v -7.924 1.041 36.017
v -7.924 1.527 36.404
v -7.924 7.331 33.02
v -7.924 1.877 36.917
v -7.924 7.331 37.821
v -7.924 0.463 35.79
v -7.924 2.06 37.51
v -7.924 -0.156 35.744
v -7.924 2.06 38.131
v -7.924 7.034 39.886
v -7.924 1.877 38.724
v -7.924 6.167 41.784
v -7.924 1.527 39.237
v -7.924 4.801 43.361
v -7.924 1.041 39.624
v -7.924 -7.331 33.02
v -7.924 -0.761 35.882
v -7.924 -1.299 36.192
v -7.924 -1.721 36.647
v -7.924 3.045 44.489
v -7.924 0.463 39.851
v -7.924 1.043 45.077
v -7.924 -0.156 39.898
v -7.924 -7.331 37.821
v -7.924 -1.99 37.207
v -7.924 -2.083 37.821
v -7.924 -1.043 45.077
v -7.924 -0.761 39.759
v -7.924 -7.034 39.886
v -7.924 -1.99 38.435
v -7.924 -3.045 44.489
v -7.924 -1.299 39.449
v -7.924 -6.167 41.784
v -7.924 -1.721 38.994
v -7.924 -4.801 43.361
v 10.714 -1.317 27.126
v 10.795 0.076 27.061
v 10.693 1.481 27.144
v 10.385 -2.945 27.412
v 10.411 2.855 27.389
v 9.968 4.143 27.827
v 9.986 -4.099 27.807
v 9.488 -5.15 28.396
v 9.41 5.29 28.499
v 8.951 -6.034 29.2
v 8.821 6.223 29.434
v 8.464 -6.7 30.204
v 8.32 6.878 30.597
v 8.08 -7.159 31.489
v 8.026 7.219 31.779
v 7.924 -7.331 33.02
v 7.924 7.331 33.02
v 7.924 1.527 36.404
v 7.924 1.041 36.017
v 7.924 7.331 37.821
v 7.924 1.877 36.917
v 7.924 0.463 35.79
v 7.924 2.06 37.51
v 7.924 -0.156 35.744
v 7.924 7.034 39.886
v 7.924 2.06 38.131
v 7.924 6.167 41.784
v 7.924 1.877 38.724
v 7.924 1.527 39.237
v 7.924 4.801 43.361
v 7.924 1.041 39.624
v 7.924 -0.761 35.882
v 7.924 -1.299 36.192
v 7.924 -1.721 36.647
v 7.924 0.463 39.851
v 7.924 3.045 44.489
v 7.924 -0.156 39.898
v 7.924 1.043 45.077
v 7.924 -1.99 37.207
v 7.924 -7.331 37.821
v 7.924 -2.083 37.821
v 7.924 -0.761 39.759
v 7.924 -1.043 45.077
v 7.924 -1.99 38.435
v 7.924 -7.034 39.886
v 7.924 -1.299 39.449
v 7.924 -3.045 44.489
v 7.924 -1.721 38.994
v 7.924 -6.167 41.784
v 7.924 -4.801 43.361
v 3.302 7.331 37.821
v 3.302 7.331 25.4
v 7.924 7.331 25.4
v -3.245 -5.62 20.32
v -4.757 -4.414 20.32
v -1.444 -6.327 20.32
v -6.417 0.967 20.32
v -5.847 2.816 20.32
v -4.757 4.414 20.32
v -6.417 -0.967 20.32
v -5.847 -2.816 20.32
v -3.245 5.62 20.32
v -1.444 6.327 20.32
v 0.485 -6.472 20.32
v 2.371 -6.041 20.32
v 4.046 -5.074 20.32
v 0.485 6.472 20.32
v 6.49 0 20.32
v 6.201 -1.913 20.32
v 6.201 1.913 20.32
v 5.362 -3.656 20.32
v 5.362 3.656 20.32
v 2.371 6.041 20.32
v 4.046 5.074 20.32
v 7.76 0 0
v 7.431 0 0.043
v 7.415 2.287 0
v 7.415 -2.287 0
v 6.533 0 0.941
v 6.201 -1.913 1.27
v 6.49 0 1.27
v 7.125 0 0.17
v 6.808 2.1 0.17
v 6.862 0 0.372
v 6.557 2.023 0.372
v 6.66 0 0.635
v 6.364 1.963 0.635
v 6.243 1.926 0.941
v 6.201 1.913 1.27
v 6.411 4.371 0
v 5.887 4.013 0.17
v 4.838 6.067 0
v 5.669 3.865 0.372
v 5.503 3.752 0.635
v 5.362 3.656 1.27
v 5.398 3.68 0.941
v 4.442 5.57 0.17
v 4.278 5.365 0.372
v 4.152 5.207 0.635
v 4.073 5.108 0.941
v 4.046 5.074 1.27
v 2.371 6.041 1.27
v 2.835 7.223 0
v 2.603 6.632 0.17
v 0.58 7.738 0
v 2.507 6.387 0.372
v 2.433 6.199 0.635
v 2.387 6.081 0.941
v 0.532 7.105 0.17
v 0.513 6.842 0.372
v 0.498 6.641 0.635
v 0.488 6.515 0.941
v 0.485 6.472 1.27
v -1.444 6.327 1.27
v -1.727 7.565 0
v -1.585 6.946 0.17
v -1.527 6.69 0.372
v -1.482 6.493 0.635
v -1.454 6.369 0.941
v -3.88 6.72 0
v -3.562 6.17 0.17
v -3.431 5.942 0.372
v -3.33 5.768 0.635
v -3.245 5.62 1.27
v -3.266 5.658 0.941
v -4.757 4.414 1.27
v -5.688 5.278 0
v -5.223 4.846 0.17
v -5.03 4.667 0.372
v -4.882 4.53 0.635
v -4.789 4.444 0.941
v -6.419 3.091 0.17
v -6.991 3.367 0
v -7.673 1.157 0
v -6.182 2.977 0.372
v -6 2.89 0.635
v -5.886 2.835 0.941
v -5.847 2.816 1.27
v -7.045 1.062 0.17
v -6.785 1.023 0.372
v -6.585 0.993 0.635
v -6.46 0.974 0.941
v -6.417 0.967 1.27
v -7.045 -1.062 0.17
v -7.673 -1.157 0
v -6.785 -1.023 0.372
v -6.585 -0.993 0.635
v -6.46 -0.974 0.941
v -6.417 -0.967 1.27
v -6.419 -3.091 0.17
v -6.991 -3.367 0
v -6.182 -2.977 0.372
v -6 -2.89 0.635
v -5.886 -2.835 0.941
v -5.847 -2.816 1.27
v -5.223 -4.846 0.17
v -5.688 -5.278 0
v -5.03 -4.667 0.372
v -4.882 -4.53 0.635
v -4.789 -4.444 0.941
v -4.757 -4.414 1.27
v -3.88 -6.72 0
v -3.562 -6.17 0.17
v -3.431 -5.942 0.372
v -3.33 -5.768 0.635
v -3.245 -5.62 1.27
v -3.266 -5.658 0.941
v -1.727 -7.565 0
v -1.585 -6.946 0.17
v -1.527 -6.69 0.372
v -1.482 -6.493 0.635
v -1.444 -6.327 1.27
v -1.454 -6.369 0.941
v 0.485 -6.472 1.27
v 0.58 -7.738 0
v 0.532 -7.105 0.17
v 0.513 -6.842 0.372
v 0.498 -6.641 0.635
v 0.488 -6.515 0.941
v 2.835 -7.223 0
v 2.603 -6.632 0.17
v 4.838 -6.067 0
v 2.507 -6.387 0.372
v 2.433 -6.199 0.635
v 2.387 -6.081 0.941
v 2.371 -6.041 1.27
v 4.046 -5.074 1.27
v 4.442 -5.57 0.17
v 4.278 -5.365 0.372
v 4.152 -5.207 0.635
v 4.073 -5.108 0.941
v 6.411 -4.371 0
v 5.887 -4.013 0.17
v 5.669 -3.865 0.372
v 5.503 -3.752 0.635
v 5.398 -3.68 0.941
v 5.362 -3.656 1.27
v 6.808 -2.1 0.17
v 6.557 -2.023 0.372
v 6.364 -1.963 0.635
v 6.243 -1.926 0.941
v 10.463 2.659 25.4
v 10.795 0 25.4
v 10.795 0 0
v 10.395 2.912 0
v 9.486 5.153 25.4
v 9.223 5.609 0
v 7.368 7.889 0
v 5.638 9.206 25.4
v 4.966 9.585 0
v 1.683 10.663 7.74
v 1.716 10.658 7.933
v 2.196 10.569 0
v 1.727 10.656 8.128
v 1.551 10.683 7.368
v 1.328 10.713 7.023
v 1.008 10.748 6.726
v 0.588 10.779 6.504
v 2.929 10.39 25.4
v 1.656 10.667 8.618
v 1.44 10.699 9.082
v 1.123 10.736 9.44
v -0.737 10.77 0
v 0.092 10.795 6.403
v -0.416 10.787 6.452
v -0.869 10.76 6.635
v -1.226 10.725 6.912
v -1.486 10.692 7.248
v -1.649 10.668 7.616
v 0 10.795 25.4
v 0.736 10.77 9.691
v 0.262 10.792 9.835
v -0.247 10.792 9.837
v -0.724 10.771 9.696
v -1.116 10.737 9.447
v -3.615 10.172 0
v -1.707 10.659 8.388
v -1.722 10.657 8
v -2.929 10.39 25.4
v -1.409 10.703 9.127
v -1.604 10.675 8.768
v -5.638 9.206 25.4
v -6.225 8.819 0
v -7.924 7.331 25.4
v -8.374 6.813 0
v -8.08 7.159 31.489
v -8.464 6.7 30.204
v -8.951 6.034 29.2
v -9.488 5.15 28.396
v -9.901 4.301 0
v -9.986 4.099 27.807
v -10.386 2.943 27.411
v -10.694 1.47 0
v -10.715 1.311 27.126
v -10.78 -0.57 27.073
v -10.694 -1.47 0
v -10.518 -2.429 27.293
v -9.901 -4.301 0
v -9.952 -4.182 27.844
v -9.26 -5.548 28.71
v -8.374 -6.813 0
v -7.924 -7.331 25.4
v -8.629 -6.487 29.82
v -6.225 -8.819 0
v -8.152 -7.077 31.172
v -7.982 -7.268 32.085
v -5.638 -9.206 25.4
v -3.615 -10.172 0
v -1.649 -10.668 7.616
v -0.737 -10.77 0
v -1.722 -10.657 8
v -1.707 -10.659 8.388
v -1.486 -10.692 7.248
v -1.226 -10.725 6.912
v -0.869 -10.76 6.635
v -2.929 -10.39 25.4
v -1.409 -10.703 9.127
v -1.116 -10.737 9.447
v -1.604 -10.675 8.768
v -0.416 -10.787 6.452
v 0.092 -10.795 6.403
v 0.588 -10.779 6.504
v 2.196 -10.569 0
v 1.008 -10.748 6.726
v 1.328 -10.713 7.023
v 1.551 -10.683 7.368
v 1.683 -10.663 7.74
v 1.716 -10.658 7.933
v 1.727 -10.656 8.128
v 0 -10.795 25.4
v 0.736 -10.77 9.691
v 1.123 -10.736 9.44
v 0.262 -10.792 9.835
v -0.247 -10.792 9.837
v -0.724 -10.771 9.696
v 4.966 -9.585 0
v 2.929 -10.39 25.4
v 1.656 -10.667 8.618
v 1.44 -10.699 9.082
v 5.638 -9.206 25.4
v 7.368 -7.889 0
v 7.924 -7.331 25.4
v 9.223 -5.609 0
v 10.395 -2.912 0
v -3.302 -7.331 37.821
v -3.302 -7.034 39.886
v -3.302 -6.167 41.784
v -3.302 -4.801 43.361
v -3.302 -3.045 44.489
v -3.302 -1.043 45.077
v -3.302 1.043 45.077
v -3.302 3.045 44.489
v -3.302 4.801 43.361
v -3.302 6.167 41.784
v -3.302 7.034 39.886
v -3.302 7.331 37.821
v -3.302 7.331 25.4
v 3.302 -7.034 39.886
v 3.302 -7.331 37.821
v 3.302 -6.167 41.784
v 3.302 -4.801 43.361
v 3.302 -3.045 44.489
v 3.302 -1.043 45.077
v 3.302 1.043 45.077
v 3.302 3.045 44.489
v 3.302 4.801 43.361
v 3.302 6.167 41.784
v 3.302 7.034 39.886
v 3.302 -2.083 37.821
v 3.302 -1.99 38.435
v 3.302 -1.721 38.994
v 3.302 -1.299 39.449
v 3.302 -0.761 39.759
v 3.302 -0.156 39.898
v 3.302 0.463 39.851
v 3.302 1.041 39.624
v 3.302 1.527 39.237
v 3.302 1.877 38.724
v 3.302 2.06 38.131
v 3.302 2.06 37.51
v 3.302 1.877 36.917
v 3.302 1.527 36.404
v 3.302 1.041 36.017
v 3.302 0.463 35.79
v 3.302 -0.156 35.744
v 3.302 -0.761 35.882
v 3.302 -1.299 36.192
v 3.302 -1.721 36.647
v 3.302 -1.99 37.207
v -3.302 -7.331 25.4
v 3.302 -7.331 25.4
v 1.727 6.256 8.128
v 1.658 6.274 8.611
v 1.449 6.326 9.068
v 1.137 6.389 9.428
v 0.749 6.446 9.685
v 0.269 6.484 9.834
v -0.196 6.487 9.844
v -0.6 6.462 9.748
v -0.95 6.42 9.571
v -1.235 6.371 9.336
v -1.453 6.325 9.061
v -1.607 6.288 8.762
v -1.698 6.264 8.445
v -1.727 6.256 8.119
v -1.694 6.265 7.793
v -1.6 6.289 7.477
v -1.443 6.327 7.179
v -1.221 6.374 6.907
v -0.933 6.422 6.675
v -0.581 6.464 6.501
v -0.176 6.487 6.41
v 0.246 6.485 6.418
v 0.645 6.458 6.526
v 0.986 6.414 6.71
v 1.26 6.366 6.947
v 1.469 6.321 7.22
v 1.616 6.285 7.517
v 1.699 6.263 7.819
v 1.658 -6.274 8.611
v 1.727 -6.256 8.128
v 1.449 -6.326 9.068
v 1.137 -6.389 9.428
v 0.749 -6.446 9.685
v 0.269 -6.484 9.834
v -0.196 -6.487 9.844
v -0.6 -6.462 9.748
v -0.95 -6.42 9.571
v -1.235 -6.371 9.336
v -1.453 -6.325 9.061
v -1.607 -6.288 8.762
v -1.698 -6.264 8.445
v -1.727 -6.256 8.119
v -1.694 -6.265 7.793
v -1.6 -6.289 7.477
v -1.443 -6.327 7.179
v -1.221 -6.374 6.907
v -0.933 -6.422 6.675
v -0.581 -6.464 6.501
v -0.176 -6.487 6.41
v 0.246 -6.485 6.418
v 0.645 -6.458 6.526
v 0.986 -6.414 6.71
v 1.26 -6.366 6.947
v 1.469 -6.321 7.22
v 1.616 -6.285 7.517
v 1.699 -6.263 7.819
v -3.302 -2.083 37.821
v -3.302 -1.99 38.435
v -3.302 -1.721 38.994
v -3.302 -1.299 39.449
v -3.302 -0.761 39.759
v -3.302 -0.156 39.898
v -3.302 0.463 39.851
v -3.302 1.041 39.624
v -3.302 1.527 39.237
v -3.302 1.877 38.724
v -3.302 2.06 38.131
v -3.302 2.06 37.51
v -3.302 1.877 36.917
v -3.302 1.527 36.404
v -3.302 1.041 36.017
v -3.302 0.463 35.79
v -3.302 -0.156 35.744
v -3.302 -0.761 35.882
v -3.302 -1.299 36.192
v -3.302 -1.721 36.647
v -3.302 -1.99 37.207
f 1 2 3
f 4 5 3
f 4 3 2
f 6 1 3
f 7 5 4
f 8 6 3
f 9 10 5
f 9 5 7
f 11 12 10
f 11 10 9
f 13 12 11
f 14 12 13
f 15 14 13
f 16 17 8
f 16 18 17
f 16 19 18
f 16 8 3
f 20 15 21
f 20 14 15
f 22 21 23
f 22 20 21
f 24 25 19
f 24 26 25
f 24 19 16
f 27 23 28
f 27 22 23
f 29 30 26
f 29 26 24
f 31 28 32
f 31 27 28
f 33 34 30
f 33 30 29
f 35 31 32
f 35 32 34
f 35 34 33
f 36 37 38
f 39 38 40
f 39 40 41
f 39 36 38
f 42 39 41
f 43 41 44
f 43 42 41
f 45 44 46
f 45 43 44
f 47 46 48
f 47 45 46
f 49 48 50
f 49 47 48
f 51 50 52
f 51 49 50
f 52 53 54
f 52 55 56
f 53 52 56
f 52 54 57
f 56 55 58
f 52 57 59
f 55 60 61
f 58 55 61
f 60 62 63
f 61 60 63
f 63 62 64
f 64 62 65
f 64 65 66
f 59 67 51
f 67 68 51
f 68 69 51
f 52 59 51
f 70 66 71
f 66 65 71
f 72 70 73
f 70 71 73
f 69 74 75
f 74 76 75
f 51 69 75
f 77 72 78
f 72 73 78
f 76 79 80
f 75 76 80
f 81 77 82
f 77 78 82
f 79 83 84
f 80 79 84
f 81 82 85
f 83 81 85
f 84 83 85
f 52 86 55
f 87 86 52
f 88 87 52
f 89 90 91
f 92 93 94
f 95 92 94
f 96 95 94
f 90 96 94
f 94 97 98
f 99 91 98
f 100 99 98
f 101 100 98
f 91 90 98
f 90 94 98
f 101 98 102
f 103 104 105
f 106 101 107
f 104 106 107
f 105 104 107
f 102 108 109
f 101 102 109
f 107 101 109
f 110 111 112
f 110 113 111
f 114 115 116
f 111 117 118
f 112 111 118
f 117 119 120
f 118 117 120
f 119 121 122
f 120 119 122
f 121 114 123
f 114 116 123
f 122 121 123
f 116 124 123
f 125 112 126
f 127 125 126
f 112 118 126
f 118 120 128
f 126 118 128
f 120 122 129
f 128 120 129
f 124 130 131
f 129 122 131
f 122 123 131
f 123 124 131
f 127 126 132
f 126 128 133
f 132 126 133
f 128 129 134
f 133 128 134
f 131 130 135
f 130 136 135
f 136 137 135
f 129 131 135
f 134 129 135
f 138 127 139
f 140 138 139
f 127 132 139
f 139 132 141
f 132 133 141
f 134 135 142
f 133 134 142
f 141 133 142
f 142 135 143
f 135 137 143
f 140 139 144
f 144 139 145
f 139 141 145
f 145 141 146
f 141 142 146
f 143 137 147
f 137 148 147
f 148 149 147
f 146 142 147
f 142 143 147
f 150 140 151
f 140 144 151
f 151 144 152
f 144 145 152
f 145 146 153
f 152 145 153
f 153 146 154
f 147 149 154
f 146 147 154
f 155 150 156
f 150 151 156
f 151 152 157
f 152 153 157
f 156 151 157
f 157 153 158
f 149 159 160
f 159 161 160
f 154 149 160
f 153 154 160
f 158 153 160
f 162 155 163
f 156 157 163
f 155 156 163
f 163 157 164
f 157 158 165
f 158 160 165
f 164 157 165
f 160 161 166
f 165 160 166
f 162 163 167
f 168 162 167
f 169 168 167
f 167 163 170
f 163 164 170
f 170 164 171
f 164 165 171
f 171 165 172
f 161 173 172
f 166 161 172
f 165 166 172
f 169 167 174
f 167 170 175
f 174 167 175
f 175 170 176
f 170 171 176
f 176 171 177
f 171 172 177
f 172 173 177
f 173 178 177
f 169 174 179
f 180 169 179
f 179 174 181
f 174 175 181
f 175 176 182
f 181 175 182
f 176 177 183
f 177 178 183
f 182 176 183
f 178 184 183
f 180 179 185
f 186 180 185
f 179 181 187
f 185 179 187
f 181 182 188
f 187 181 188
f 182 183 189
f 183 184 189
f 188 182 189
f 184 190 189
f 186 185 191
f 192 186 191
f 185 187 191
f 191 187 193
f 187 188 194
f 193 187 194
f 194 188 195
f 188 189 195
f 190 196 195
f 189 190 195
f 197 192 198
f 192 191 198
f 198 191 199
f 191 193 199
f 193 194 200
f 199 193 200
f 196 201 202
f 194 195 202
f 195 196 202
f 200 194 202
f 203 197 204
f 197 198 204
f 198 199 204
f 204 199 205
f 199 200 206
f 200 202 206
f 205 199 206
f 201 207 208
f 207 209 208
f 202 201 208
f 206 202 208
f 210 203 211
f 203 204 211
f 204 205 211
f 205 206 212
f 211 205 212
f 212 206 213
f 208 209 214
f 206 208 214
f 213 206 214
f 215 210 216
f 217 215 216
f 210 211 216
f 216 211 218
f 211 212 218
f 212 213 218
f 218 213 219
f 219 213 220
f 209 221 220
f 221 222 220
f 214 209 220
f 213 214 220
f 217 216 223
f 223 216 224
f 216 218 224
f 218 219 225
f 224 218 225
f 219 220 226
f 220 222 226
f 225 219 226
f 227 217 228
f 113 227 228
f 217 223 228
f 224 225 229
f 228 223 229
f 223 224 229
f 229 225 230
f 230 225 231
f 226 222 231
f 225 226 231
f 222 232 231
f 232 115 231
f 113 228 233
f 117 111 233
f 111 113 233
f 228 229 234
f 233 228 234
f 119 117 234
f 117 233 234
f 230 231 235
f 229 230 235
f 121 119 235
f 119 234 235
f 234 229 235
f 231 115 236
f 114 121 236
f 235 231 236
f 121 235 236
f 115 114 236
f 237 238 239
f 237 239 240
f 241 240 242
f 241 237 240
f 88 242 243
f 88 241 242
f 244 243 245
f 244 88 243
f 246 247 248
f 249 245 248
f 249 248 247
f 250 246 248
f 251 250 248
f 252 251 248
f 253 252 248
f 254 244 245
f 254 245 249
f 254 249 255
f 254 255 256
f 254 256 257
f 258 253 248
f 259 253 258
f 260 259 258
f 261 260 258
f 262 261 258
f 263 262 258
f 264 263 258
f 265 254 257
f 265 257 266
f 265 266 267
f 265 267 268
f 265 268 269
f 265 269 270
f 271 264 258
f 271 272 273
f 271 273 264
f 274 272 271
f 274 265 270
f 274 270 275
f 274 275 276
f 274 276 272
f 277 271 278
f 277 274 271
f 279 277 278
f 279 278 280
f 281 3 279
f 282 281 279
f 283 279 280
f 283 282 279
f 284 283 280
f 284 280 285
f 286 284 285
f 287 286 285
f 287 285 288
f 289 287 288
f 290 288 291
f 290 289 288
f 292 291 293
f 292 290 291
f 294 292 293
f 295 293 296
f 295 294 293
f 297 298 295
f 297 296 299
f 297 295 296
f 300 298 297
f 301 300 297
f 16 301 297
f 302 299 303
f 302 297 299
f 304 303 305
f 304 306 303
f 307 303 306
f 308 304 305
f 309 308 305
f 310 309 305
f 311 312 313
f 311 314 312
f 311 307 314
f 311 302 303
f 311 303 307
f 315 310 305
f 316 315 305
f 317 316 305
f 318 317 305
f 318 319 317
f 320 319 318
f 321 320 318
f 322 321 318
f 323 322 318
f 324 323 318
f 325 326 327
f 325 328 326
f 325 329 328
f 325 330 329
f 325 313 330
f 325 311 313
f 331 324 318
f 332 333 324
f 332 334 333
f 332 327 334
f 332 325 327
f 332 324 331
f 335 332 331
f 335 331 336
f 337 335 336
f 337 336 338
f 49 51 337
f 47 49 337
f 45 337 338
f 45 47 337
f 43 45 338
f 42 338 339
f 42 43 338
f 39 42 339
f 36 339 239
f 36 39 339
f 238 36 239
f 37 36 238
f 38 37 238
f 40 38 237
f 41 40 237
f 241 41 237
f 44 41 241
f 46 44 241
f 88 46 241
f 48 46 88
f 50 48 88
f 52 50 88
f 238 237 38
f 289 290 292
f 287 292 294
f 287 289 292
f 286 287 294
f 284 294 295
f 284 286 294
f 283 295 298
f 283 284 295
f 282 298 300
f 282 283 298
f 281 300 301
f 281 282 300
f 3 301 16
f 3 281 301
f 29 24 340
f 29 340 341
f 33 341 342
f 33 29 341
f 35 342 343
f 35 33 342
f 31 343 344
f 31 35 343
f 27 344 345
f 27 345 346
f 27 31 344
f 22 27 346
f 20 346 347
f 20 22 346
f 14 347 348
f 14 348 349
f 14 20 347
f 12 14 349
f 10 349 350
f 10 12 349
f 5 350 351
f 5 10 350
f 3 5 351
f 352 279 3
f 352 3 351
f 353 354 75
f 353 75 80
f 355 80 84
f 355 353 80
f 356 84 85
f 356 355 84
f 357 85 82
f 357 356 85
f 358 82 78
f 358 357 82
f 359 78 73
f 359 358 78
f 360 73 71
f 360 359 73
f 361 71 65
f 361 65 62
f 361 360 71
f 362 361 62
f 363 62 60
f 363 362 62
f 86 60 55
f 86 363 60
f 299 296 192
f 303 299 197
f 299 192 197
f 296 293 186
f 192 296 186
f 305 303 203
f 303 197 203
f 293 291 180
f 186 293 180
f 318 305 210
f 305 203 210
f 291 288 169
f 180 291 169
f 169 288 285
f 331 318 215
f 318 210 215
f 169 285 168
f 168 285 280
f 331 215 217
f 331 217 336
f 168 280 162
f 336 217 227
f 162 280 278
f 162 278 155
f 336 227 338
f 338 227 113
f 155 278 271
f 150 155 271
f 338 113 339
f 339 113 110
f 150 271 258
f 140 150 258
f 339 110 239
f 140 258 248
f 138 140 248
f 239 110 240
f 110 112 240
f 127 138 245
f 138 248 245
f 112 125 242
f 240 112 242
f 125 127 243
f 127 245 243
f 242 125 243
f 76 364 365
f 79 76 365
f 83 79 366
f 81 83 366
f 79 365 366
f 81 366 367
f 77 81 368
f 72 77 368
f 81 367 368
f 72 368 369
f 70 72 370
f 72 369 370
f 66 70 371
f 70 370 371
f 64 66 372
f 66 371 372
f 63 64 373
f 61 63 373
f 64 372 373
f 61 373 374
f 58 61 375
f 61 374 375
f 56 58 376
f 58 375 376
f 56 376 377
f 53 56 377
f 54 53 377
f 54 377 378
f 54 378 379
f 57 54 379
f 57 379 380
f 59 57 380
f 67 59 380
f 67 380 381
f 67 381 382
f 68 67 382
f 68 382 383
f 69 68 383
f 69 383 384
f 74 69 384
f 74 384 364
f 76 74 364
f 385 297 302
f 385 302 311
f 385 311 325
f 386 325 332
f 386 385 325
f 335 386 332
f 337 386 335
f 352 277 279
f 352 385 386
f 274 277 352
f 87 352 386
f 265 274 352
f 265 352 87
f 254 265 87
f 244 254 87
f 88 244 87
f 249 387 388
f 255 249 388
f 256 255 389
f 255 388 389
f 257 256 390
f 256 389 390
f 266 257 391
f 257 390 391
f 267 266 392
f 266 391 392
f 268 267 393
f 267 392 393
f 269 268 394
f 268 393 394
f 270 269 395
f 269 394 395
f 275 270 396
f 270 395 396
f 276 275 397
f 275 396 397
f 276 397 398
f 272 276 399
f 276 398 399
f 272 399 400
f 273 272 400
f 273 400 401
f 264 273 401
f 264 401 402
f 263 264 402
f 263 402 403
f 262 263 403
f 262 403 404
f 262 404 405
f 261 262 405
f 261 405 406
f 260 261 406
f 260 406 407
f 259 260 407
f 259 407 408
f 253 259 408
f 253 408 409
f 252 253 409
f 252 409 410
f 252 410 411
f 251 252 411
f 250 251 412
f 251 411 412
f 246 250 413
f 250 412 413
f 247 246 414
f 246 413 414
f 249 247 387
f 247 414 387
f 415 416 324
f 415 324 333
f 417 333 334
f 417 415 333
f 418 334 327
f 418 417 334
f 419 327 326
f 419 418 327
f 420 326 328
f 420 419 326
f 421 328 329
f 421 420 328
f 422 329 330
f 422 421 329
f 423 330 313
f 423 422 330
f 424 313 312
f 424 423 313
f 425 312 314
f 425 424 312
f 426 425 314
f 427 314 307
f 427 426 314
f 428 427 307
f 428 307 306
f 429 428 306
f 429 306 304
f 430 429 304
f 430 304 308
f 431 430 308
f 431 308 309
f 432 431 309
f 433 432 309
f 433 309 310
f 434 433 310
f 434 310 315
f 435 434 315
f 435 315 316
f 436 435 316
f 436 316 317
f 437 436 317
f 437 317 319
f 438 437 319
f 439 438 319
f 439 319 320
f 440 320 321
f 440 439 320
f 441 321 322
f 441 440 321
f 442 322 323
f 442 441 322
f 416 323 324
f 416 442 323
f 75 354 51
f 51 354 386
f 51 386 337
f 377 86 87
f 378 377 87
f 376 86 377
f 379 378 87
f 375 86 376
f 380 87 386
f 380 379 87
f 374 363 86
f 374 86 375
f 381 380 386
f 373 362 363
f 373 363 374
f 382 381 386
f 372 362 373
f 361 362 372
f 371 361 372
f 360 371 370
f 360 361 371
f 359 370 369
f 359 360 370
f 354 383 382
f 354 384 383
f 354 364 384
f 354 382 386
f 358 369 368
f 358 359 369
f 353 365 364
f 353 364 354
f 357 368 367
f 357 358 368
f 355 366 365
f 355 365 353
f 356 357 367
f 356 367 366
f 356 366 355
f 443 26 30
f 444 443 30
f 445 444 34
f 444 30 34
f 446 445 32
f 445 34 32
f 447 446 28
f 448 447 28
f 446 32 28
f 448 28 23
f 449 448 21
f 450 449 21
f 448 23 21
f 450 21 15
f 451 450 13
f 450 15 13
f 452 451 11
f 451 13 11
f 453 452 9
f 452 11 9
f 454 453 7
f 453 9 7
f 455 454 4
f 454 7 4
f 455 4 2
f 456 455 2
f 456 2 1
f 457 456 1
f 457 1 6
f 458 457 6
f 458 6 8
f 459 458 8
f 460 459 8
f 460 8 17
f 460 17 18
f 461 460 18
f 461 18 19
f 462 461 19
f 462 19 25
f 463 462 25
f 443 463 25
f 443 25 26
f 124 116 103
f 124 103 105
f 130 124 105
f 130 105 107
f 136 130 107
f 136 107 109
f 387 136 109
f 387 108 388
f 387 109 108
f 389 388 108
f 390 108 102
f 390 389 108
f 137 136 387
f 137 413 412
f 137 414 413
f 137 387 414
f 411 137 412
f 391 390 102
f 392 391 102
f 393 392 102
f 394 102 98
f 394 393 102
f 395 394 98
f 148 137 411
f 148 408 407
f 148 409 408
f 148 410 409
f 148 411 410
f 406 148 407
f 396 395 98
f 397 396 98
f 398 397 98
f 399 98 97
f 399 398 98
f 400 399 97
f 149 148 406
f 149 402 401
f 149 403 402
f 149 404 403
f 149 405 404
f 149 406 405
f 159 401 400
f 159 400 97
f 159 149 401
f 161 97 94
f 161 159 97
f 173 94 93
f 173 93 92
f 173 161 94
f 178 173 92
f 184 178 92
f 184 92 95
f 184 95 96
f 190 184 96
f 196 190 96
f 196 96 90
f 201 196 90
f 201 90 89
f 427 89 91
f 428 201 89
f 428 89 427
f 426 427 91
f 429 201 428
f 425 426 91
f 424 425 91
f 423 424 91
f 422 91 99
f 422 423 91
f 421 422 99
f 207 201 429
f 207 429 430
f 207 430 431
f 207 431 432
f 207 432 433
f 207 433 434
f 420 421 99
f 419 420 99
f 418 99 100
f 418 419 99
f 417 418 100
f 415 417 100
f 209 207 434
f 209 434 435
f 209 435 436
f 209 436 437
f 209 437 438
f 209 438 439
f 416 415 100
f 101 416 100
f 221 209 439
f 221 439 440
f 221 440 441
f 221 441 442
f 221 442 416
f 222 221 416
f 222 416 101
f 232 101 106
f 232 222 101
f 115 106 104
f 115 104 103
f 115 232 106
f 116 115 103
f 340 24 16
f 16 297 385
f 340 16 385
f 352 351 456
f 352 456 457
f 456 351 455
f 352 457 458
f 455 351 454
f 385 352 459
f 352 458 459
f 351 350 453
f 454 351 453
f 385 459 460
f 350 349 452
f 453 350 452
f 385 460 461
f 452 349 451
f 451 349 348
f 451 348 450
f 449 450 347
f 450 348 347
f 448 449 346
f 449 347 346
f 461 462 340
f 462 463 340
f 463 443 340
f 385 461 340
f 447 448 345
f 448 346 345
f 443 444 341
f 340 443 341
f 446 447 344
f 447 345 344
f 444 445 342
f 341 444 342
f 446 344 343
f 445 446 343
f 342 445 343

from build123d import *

# Parameters (mm, degrees)
F0_R          = 10.795
F0_R_2        = 6.4897
F1_DEPTH      = 20.32
F2_R          = 10.795
F3_DEPTH      = 5.08
F4_W          = 4.6222759372
F4_H          = 14.661224488
F5_DEPTH      = 12.4206
F6_R          = 1.7272
F7_DEPTH      = 10.796
F7_DEPTH_BACK = 25.4
F9_DEPTH      = 4.6222759372
F10_R         = 7.330612244
F11_DEPTH     = 4.6222759372
F12_R         = 2.0828
F13_DEPTH     = 18.7202760372
F14_T4_DEPTH  = 14.661224488
F14_S5_R      = 10.795
F14_T6_DEPTH  = 11
F14_T10_DEPTH = 14.661224488
F14_S11_R     = 10.795
F14_T12_DEPTH = 11
F15_R         = 1.27


# Not quite as in the source:
# - a fillet or chamfer that OpenCascade refuses, or shapes differently, is made with other operations: its cross-section is extruded or revolved along the edge and cut away or added


with BuildPart() as f1:
    # F0 (on Top) → F1 (new body)
    with BuildSketch(Plane.XY):
        Circle(F0_R)
        Circle(F0_R_2, mode=Mode.SUBTRACT)
    extrude(amount=F1_DEPTH)

    # F2 (on face) → F3 (join)
    with BuildSketch(Plane.XY.offset(20.32)):
        Circle(F2_R)
    extrude(amount=F3_DEPTH)

    # F4 (on face) → F5 (join)
    with BuildSketch(Plane.XY.offset(25.4)):
        with Locations((-5.6131379686, 0)):
            Rectangle(F4_W, F4_H)
        with Locations((5.6131379686, 0)):
            Rectangle(F4_W, F4_H)
    extrude(amount=F5_DEPTH)

    # F6 (on Front) → F7 (cut, two sides)
    with BuildSketch(Plane.XZ) as f7_sk:
        with Locations((0, 8.128)):
            Circle(F6_R)
    extrude(amount=F7_DEPTH, mode=Mode.SUBTRACT)
    extrude(f7_sk.sketch, amount=-F7_DEPTH_BACK, mode=Mode.SUBTRACT)

    # F8 (on face) → F9 (join, through all)
    with BuildSketch(Plane(origin=(3.302, 0, 0), x_dir=(0, -1, 0), z_dir=(-1, 0, 0))):
        with BuildLine():
            Line((-7.330612244, 37.8206), (7.330612244, 37.8206))
            ThreePointArc((7.330612244, 37.8206), (0, 45.151212244), (-7.330612244, 37.8206))
        make_face()
    extrude(amount=-F9_DEPTH)

    # F10 (on face) → F11 (join, through all)
    with BuildSketch(Plane(origin=(-7.9242759372, 0, 0), x_dir=(0, -1, 0), z_dir=(-1, 0, 0))):
        with Locations((0, 37.8206)):
            Circle(F10_R)
    extrude(amount=-F11_DEPTH)

    # F12 (on face) → F13 (cut, through all)
    with BuildSketch(Plane(origin=(-7.9242759372, 0, 0), x_dir=(0, -1, 0), z_dir=(-1, 0, 0))):
        with Locations((0, 37.8206)):
            Circle(F12_R)
    extrude(amount=-F13_DEPTH, mode=Mode.SUBTRACT)

    # F14: fillet of radius 7.62 on 2 edges, made by hand


with BuildPart() as f14_tool2:
    # F14_s3 → F14_t4 (new body)
    with BuildSketch(Plane.XZ.offset(7.330612244)):
        with BuildLine():
            ThreePointArc((15.5442759372, 25.4), (10.1561222645, 27.6318463274), (7.9242759372, 33.02))
            Line((7.9242759372, 33.02), (7.9242759372, 25.4))
            Line((7.9242759372, 25.4), (15.5442759372, 25.4))
        make_face()
    extrude(amount=-F14_T4_DEPTH)

    # F14_s5 → F14_t6 (intersect, symmetric)
    with BuildSketch(Plane.XY.offset(29.2)):
        Circle(F14_S5_R)
    extrude(amount=F14_T6_DEPTH, both=True, mode=Mode.INTERSECT)


with BuildPart() as f1_1:
    add(f1.part)

    # F14_t1: union F14_tool2
    add(f14_tool2.part)


with BuildPart() as f14_tool8:
    # F14_s9 → F14_t10 (new body)
    with BuildSketch(Plane.XZ.offset(-7.330612244)):
        with BuildLine():
            ThreePointArc((-15.5442759372, 25.4), (-10.1561222645, 27.6318463274), (-7.9242759372, 33.02))
            Line((-7.9242759372, 33.02), (-7.9242759372, 25.4))
            Line((-7.9242759372, 25.4), (-15.5442759372, 25.4))
        make_face()
    extrude(amount=F14_T10_DEPTH)

    # F14_s11 → F14_t12 (intersect, symmetric)
    with BuildSketch(Plane.XY.offset(29.2)):
        Circle(F14_S11_R)
    extrude(amount=F14_T12_DEPTH, both=True, mode=Mode.INTERSECT)


with BuildPart() as f1_2:
    add(f1_1.part)

    # F14_t7: union F14_tool8
    add(f14_tool8.part)

    # F15
    f15_edges = [f1_2.edges().sort_by_distance(p)[0] for p in [
        (-6.4897, 0, 0),
    ]]
    fillet(f15_edges, radius=F15_R)


solid = f1_2.part
